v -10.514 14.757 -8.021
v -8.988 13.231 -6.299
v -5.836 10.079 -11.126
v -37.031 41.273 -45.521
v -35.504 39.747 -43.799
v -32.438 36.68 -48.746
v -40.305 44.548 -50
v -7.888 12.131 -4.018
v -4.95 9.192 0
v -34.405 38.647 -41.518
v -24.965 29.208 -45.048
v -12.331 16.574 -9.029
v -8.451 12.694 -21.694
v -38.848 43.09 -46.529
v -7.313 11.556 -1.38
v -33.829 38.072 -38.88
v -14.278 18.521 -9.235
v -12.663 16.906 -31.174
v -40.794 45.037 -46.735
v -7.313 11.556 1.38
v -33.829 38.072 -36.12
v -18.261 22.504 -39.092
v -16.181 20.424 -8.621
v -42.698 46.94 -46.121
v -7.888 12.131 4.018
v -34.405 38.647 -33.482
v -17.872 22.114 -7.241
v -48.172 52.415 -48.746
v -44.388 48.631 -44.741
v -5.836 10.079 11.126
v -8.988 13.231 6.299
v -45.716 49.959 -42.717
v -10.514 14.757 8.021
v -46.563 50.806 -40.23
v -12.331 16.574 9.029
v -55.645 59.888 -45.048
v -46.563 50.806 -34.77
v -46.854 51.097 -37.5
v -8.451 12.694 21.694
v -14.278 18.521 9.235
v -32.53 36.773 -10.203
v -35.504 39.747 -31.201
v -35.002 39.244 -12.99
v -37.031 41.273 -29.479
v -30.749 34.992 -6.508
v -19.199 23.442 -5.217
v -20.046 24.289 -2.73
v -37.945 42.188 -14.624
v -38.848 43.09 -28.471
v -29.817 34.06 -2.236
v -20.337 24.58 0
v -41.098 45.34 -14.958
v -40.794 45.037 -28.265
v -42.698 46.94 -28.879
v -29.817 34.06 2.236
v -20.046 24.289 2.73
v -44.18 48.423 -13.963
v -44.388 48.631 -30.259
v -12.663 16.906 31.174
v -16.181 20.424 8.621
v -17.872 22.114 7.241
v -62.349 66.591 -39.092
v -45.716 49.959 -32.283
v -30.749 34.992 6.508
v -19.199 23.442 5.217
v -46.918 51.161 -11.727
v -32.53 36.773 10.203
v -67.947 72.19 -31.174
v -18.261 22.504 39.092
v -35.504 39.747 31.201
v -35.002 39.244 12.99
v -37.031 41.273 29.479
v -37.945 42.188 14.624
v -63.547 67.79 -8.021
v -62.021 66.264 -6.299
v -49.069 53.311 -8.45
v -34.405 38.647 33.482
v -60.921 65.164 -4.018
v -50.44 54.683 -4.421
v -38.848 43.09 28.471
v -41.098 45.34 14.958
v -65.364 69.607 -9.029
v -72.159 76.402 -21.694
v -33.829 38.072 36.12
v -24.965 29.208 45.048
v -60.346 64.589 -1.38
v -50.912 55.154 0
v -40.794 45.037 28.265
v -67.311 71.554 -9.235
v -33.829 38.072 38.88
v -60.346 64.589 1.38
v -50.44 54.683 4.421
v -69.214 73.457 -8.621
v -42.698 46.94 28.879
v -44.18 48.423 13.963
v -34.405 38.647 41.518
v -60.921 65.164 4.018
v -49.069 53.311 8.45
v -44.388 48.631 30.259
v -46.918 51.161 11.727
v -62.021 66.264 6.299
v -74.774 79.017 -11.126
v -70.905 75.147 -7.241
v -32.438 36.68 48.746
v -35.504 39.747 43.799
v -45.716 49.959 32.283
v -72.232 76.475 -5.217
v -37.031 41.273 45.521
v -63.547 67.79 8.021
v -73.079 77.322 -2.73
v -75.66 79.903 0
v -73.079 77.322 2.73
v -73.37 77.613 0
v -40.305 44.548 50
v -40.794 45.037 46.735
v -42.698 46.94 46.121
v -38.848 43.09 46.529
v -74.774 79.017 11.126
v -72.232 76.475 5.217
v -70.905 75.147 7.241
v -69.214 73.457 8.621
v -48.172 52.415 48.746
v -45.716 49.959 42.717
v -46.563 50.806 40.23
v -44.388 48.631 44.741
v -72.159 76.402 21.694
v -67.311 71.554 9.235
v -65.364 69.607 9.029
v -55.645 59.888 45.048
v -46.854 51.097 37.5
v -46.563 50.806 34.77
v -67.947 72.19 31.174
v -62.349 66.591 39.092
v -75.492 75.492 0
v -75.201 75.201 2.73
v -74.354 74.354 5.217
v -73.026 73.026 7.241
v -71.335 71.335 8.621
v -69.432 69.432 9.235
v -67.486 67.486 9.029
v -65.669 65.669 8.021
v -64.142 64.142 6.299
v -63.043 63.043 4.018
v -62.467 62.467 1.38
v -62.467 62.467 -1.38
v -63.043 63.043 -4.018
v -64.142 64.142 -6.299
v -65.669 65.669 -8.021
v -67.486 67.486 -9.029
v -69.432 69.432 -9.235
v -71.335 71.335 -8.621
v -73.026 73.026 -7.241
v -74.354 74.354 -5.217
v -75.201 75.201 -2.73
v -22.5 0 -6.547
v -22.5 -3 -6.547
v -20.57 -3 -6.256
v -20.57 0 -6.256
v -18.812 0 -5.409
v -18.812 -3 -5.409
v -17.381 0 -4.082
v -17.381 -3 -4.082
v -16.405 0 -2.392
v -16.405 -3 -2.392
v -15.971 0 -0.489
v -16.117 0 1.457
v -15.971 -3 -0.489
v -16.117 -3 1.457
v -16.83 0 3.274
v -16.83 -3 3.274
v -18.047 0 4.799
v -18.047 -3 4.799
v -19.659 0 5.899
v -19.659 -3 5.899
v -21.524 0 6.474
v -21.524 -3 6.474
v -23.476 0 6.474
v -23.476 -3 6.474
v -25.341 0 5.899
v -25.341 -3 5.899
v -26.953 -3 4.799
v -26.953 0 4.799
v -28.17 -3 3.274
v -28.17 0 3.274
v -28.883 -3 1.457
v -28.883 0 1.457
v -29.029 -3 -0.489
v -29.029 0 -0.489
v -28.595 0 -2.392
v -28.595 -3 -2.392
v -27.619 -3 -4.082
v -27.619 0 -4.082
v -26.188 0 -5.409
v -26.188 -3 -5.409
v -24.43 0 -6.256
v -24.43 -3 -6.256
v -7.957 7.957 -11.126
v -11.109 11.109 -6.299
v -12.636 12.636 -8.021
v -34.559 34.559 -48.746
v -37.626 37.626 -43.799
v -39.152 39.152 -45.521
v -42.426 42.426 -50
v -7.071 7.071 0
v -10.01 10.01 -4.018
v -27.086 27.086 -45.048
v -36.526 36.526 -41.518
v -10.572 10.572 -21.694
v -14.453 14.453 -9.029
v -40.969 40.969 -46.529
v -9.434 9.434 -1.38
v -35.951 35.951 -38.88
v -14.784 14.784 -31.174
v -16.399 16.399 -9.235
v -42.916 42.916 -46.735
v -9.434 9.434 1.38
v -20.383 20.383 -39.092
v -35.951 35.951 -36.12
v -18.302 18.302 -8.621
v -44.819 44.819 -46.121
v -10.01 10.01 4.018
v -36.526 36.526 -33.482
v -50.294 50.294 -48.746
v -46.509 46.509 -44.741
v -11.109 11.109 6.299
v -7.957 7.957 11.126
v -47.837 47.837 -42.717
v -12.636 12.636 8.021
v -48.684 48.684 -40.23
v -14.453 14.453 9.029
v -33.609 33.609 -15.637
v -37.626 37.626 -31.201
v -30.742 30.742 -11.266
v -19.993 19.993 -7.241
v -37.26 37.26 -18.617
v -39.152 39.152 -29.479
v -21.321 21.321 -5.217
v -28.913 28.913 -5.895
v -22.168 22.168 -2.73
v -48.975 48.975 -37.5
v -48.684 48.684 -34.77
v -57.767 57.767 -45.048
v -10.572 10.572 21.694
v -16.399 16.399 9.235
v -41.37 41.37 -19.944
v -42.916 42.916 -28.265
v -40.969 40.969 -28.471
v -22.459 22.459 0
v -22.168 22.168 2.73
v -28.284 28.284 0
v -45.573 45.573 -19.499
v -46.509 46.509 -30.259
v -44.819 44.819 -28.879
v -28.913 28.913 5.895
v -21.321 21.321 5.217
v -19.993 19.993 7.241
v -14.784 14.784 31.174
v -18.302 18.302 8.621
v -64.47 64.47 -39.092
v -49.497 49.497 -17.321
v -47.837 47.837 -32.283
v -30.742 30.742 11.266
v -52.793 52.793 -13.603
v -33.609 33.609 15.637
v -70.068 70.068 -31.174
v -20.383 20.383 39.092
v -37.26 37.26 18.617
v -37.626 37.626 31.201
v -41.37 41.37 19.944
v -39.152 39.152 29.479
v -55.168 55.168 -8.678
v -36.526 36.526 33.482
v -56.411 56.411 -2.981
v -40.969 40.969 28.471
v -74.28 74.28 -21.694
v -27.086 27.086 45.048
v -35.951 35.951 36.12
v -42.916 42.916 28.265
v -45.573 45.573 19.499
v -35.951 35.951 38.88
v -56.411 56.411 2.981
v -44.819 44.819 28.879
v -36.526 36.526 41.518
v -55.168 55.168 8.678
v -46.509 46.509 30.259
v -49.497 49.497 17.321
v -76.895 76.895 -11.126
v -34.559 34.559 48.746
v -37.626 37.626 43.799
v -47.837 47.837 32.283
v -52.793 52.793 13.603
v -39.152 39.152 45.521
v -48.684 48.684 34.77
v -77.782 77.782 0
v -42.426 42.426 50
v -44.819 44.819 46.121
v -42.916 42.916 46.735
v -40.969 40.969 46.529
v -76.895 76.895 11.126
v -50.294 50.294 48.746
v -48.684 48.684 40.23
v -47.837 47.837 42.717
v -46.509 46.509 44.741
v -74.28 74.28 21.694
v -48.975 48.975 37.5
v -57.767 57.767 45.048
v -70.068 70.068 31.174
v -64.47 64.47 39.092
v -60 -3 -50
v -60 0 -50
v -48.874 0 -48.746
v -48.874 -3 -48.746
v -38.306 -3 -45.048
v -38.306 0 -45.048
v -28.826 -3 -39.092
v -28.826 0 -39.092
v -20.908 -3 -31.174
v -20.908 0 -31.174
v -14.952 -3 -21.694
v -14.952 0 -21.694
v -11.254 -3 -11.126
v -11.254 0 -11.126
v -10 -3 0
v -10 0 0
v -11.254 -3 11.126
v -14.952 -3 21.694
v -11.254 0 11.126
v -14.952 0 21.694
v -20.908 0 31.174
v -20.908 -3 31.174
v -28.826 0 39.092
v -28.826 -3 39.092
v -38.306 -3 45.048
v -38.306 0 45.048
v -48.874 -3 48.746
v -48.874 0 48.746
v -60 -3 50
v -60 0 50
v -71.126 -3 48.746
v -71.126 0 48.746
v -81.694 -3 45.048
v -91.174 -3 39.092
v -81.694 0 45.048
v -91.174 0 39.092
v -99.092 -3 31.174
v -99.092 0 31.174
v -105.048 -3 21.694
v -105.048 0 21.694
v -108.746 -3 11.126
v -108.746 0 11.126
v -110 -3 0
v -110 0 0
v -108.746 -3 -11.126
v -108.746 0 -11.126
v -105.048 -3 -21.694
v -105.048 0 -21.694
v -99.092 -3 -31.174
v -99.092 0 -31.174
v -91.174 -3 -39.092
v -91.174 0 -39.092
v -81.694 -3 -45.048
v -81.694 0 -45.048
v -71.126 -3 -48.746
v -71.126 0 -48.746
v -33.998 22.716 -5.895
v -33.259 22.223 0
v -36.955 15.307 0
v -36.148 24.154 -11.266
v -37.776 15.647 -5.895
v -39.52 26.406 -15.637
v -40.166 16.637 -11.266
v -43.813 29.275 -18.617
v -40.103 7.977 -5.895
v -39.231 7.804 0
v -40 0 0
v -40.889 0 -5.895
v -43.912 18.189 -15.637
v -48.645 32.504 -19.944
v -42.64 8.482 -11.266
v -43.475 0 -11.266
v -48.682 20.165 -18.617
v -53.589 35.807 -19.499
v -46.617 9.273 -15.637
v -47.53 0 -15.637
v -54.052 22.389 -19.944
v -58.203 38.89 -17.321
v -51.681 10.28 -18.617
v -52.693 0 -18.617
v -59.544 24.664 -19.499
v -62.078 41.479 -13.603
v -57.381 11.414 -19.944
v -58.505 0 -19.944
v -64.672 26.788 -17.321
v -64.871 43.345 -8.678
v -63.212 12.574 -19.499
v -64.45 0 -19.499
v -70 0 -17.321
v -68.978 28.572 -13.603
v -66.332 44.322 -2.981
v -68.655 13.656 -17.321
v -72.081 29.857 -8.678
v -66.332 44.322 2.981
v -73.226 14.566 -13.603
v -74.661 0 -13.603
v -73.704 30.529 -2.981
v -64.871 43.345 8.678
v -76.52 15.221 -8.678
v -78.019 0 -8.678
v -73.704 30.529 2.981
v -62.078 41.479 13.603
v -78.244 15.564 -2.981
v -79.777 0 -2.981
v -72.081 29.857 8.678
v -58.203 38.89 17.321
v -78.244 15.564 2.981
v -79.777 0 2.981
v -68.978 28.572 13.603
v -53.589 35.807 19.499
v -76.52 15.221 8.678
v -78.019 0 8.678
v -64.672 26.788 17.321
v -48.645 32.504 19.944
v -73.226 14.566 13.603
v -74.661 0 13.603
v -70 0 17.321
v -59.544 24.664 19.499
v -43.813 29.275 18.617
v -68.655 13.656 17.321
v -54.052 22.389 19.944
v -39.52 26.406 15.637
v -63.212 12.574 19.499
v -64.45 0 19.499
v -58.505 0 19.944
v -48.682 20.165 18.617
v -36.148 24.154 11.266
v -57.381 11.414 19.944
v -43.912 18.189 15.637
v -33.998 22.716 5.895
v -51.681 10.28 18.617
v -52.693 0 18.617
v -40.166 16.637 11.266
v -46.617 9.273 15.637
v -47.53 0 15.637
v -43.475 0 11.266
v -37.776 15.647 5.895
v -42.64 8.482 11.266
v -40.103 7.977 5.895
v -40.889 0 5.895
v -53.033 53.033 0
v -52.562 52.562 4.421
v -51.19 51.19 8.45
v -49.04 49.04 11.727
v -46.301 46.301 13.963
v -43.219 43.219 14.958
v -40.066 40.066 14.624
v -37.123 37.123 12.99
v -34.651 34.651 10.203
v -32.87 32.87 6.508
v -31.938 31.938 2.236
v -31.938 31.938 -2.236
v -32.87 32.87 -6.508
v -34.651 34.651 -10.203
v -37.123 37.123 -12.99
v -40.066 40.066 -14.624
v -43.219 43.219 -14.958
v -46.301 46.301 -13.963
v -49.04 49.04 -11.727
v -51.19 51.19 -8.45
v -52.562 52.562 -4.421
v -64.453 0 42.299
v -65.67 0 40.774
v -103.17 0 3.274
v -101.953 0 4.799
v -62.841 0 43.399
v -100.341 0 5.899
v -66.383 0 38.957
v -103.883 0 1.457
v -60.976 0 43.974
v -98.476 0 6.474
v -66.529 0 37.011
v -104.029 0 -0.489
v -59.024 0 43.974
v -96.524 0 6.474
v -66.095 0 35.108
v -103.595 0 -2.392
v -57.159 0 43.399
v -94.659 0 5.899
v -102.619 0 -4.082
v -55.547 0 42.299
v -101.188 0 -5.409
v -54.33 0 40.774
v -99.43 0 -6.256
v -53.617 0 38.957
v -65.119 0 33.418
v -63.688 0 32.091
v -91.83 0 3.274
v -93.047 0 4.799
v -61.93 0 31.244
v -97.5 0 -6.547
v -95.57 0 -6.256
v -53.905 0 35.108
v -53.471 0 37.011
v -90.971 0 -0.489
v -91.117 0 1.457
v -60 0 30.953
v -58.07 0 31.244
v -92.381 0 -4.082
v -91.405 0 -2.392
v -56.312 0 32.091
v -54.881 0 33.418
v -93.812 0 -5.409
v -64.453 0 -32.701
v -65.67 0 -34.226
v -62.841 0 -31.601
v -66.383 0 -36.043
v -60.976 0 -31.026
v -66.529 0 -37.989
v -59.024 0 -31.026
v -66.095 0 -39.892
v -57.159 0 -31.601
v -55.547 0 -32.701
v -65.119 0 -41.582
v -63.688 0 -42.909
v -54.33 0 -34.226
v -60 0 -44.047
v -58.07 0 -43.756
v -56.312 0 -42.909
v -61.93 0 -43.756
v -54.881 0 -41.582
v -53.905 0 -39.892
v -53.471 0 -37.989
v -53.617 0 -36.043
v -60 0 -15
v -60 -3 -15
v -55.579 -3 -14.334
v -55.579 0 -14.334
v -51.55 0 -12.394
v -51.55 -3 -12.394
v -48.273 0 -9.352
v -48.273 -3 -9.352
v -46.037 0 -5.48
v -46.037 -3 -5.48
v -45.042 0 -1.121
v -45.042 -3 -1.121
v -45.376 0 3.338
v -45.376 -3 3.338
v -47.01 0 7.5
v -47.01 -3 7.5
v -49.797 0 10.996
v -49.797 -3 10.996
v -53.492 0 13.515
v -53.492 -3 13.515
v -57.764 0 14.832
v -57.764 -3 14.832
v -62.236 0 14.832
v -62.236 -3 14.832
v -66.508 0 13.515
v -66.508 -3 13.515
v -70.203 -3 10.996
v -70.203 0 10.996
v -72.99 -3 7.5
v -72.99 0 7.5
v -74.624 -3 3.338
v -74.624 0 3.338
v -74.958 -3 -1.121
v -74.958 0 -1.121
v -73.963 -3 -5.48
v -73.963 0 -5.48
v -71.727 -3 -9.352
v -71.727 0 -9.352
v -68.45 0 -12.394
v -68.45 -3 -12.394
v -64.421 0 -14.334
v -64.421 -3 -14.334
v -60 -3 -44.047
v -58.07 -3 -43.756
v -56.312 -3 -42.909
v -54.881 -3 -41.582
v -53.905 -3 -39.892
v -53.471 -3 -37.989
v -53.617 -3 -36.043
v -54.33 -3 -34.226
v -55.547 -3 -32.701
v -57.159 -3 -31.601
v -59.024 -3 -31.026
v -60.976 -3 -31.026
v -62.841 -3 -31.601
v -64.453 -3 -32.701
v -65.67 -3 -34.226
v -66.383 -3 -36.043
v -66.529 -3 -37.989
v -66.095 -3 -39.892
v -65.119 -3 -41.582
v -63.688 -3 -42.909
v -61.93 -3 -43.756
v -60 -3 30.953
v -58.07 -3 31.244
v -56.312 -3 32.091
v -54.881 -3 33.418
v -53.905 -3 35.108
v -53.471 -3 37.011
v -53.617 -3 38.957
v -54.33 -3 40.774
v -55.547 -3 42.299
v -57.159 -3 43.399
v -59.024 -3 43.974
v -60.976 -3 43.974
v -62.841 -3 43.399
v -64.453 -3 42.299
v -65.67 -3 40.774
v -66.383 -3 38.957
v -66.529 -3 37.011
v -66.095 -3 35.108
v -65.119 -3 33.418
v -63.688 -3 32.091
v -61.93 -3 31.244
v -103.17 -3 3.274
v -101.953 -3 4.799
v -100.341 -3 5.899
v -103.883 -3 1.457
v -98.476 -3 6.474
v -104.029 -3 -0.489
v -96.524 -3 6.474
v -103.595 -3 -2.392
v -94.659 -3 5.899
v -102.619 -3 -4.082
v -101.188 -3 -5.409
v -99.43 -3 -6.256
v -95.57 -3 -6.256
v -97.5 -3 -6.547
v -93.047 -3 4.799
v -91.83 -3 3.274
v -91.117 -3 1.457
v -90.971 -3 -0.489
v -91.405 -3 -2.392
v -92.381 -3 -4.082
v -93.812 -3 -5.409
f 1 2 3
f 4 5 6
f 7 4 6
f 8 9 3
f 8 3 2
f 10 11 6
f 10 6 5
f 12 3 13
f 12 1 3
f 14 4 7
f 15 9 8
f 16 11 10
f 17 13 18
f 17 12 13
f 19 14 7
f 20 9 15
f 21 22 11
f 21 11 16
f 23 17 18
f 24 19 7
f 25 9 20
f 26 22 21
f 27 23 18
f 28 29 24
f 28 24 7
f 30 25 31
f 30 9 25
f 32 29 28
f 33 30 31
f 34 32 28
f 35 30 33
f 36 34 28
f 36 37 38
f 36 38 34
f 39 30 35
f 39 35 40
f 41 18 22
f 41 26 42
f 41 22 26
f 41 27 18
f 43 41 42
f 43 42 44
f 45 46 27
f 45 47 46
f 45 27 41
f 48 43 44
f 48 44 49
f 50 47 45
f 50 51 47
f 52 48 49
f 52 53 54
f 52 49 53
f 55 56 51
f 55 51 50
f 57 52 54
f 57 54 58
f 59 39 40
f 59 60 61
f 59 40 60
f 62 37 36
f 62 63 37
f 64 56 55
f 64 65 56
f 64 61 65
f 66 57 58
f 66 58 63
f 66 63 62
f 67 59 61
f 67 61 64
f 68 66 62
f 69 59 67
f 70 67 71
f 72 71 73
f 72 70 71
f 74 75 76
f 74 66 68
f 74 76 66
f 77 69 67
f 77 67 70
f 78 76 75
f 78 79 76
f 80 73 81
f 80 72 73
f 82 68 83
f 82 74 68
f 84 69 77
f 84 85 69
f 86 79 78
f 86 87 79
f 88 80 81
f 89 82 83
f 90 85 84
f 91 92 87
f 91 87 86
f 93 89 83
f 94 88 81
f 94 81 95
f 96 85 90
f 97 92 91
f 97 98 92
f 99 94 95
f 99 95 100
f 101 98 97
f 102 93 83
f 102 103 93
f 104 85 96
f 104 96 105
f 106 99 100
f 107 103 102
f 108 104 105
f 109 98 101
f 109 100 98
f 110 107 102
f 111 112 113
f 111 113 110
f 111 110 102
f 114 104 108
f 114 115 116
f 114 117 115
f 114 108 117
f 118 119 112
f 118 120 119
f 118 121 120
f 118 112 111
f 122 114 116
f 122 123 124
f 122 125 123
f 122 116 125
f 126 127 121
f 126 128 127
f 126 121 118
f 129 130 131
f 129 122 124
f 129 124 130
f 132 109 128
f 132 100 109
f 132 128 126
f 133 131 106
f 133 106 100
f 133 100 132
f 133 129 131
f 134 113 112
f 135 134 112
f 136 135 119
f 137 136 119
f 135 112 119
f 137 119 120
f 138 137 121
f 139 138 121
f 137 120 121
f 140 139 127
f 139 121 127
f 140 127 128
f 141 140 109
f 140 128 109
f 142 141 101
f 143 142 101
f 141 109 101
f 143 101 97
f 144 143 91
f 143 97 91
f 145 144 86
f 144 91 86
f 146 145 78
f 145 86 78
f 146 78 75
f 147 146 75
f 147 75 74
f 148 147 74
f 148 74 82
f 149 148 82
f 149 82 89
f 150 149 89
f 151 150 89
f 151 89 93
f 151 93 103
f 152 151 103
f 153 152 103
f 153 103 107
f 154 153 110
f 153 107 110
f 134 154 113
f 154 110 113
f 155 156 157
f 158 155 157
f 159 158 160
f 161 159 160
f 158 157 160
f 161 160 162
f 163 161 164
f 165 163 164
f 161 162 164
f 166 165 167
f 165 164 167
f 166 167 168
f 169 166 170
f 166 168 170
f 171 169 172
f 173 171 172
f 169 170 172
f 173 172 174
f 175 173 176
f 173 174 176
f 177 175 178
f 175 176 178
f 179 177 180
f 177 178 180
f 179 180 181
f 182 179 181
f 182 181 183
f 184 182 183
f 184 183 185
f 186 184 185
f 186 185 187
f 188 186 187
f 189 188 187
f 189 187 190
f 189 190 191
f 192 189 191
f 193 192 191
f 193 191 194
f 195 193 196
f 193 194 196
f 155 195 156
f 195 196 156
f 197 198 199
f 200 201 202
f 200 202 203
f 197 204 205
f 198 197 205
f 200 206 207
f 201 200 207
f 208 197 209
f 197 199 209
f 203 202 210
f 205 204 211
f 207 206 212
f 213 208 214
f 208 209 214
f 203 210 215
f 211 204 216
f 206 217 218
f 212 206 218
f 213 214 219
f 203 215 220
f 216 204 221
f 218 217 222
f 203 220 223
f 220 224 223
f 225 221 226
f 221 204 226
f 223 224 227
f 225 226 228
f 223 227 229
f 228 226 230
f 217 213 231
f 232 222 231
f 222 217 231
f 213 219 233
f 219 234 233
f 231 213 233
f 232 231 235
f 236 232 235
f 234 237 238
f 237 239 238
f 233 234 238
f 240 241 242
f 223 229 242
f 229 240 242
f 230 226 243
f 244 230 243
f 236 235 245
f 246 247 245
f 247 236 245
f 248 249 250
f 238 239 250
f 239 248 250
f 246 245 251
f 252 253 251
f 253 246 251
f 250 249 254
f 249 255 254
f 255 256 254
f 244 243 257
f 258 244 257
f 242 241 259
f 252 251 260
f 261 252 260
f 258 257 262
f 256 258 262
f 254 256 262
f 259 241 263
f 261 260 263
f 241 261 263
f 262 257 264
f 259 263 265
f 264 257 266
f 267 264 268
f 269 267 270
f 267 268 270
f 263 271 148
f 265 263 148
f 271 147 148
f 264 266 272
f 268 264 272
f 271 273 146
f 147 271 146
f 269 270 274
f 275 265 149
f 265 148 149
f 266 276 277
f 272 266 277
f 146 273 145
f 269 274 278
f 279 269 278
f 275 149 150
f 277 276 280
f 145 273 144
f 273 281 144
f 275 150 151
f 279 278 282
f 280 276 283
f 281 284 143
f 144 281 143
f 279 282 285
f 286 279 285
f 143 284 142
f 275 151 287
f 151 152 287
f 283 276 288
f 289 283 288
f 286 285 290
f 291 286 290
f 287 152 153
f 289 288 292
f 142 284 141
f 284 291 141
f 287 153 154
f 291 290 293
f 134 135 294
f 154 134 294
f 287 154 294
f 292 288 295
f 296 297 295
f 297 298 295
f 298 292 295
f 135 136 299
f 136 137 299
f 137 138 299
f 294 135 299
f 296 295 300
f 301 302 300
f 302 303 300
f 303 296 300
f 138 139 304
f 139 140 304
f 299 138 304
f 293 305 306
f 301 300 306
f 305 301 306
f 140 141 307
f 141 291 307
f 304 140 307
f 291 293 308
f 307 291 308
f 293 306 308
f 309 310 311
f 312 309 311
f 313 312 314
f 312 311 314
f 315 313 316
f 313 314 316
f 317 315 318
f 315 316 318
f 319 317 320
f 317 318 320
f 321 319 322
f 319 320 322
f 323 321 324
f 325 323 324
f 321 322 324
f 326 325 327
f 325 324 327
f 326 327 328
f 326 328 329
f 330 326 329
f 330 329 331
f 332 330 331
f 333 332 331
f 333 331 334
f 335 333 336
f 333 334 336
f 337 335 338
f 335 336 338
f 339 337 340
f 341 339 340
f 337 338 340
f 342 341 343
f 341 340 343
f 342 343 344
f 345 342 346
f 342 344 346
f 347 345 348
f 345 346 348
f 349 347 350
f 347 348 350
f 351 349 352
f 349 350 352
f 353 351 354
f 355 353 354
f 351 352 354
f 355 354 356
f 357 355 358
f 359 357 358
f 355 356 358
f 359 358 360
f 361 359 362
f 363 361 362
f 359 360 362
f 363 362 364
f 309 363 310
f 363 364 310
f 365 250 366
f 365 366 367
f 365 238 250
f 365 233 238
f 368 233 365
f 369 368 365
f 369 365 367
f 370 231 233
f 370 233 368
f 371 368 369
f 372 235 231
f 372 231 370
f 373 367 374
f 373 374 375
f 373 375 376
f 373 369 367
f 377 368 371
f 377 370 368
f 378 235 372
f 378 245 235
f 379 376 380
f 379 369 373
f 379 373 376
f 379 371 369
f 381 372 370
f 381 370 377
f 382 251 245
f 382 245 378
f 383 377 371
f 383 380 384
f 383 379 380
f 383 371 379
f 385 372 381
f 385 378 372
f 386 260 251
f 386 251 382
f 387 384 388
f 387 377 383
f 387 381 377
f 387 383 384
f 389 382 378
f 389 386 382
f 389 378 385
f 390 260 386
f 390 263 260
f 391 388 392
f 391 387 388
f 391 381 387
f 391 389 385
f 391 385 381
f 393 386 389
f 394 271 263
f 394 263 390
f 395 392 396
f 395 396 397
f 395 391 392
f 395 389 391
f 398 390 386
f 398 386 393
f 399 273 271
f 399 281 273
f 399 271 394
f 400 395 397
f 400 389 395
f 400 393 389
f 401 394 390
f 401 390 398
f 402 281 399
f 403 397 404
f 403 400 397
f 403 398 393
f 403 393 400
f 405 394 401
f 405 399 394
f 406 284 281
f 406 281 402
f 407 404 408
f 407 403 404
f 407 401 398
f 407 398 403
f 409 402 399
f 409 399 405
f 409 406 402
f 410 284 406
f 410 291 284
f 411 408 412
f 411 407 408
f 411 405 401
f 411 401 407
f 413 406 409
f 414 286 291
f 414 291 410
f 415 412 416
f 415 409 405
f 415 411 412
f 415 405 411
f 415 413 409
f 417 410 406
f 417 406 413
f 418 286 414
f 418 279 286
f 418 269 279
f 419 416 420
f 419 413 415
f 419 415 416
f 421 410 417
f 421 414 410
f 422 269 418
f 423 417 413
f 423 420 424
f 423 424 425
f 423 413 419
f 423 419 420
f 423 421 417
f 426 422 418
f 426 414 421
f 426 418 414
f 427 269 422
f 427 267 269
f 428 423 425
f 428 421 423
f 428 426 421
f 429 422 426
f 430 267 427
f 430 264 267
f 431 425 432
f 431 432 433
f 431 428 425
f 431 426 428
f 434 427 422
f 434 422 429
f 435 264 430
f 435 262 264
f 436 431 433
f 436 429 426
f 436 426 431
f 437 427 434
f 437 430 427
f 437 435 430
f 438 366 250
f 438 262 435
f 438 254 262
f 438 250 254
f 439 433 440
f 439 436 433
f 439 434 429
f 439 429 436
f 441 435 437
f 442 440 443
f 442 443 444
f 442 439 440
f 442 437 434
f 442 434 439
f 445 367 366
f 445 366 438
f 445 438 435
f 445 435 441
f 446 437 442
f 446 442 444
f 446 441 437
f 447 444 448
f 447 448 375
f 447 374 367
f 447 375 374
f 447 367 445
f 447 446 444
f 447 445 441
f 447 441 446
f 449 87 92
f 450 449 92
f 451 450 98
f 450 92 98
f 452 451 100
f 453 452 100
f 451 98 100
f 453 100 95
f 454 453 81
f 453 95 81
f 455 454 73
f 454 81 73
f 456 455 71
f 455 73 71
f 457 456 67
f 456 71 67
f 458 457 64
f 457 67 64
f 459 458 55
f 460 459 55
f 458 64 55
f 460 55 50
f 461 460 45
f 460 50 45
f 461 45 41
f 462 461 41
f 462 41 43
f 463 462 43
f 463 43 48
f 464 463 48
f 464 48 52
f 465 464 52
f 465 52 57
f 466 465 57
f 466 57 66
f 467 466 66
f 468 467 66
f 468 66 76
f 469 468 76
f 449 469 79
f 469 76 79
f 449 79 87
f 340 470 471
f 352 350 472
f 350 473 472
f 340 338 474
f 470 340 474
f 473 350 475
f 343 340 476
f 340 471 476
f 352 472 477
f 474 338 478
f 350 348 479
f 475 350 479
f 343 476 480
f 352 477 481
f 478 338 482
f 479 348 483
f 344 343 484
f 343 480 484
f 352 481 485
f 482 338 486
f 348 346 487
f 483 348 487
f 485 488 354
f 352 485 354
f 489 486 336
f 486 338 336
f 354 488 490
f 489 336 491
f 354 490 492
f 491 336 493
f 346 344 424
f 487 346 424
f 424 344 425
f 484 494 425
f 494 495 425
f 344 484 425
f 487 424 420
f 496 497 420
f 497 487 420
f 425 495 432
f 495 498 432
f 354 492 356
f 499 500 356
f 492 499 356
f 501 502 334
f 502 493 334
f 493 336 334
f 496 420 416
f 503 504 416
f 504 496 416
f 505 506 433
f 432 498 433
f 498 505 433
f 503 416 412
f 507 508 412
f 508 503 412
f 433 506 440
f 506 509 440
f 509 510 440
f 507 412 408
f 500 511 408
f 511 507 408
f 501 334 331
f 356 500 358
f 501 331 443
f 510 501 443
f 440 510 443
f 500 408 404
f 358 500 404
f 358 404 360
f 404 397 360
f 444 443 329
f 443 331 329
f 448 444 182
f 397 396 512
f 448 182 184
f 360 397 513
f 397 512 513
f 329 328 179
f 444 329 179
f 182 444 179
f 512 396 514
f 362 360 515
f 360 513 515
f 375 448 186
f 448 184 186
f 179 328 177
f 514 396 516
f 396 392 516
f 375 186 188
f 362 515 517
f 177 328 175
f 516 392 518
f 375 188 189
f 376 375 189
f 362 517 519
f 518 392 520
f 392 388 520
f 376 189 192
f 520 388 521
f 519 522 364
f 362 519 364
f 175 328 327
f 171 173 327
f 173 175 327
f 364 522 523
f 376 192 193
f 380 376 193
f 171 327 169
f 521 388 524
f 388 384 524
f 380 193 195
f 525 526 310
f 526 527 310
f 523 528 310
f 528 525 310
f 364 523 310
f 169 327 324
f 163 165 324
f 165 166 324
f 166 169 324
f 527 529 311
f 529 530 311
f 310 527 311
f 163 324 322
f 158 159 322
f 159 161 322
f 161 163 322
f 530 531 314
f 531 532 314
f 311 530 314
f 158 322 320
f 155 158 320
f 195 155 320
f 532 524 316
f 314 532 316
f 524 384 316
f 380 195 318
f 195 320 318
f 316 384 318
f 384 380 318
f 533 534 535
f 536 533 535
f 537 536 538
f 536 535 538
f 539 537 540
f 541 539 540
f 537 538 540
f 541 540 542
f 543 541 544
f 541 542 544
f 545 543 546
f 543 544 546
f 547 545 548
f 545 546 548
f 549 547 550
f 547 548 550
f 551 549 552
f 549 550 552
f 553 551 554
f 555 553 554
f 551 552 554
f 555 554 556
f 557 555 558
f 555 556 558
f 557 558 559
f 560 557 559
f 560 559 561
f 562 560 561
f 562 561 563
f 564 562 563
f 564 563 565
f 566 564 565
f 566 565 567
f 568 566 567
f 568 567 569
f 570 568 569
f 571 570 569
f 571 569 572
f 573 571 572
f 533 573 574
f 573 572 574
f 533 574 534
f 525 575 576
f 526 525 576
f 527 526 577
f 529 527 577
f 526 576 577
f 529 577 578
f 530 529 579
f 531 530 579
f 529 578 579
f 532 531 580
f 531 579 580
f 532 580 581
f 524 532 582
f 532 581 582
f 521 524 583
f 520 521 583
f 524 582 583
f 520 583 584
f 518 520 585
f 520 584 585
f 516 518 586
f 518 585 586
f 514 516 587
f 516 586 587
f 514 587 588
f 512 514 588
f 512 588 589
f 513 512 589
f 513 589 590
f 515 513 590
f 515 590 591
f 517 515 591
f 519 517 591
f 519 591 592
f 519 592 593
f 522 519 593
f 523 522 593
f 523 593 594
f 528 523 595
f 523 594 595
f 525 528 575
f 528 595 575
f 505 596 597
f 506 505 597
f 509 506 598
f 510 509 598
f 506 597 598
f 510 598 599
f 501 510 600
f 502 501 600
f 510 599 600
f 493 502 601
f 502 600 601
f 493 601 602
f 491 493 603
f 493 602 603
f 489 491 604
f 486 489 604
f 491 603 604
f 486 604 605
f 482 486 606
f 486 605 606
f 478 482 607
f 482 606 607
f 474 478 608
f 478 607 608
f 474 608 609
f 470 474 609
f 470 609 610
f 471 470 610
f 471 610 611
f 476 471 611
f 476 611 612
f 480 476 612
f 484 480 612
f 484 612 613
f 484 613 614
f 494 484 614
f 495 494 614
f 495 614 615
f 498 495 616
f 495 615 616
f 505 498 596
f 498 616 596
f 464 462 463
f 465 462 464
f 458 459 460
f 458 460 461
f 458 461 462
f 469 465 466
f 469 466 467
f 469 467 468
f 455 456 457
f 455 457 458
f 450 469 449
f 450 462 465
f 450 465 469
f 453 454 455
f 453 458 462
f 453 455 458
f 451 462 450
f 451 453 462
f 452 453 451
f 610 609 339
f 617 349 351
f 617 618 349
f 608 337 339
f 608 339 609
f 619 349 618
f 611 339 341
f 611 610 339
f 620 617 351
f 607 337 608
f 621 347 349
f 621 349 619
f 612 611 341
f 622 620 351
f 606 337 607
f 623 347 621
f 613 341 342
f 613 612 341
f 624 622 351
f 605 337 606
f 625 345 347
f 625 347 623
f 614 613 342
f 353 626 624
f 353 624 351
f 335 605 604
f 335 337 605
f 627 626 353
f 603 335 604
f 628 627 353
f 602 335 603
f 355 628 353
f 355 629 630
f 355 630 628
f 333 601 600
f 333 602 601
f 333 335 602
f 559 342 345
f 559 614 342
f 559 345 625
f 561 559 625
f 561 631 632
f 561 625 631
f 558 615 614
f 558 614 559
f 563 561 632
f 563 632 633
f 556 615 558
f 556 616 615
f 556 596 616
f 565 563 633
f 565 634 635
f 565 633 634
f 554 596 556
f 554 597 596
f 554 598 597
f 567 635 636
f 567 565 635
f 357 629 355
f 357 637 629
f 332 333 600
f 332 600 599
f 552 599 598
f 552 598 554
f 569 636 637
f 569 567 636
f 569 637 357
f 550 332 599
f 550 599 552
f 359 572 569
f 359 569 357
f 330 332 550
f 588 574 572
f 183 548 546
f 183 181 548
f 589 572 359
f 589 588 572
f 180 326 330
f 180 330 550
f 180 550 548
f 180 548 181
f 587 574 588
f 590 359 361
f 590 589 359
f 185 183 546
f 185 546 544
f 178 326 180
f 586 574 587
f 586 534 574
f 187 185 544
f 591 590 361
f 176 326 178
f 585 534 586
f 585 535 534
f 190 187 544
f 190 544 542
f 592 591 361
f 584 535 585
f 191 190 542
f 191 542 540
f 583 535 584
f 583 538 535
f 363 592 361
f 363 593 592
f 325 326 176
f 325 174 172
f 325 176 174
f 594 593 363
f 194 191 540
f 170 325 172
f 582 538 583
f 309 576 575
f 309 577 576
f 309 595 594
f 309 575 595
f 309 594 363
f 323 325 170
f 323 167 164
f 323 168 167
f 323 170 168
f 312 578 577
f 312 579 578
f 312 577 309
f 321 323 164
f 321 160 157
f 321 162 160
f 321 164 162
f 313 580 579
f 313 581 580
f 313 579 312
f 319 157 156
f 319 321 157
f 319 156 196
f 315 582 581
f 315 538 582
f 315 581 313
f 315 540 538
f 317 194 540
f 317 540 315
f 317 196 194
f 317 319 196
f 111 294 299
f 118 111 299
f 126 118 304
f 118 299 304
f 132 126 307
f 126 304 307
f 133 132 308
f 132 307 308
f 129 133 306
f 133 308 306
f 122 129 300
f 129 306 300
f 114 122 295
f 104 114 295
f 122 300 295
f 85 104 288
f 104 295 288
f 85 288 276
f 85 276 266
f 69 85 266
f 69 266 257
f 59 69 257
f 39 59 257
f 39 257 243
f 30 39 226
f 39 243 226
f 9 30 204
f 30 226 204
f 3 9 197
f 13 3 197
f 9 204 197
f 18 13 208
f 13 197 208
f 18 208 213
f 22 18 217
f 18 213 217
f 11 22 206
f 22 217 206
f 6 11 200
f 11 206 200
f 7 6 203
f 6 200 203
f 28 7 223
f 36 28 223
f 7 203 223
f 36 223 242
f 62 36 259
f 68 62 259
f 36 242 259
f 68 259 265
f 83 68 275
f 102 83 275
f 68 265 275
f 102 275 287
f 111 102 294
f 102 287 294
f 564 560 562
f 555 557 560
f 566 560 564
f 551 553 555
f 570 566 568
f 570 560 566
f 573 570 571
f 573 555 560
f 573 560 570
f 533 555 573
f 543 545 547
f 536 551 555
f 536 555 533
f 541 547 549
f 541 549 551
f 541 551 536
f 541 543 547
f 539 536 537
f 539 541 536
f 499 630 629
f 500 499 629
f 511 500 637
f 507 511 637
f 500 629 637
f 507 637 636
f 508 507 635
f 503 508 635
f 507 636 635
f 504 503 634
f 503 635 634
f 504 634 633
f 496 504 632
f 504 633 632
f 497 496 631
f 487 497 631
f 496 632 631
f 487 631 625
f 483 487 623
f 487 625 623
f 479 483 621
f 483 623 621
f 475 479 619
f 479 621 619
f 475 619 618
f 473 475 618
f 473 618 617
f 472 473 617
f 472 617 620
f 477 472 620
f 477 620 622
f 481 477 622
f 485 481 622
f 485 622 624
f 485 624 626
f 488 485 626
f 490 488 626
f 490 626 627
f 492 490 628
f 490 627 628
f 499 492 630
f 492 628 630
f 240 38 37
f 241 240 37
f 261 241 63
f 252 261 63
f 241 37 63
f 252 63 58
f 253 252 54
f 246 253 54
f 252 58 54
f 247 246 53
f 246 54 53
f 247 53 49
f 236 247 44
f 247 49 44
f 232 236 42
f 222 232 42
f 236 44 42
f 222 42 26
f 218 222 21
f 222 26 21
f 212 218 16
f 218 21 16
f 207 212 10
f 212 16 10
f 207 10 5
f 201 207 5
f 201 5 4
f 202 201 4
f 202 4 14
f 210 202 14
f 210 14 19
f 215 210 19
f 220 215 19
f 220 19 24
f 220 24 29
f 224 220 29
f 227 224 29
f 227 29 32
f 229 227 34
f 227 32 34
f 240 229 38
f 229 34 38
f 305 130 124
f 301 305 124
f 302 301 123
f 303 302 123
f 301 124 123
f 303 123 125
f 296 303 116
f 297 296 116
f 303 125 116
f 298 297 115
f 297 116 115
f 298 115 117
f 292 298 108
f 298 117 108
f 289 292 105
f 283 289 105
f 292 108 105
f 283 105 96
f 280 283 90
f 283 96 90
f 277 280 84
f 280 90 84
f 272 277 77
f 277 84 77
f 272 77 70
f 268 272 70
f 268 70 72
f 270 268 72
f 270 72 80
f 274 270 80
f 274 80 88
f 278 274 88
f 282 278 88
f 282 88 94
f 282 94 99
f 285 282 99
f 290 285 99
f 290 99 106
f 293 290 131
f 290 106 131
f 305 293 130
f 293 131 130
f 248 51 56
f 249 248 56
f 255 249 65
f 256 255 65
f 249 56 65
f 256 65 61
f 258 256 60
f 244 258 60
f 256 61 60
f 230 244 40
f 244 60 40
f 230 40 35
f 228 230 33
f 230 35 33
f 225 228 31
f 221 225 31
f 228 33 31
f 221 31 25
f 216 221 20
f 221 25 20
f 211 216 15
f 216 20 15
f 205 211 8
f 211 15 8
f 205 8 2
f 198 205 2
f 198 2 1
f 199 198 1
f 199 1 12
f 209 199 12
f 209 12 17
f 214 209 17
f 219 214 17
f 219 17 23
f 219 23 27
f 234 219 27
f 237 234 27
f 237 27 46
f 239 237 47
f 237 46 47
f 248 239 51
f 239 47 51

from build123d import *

# Parameters (mm, degrees)
SKETCH_2_R          = 20
SKETCH_5_R          = 50
EXTRUDE_1_DEPTH     = 3
SKETCH_6_R          = 15
SKETCH_6_R_2        = 9.261363372
CUT_EXTRUDE_1_DEPTH = 3
SKETCH_8_R          = 50
EXTRUDE_2_DEPTH     = 3
SKETCH_9_R          = 15
SKETCH_9_R_2        = 6.547134089
CUT_EXTRUDE_2_DEPTH = 3


with BuildPart() as part:
    # 扫描1: sweep along a path in 草图1
    with BuildLine(Plane.XY) as sweep_1_path:
        ThreePointArc((-42.426406871, 42.426406871), (-55.432771951, 22.961005942), (-60, 0))
    # 草图2 → 扫描1 (sweep)
    with BuildSketch(Plane(origin=(0, 0, 0), x_dir=(1, 0, 0), z_dir=(0, 1, 0))):
        with Locations((-60, 0)):
            Circle(SKETCH_2_R)
    sweep(path=sweep_1_path.line)

    # 草图5 → 凸台-拉伸1 (add)
    with BuildSketch(Plane(origin=(0, 0, 0), x_dir=(0, 0, -1), z_dir=(0.7071067811865434, 0.7071067811865517, 0))):
        with Locations(Location((0, 60, 0), (0, 0, 90))):
            Circle(SKETCH_5_R)
    extrude(amount=EXTRUDE_1_DEPTH)

    # 草图6 → 切除-拉伸1 (cut)
    with BuildSketch(Plane(origin=(2.121320344, 2.121320344, 0), x_dir=(0, 0, -1), z_dir=(0.7071067811865434, 0.7071067811865517, 0))):
        with Locations(Location((0, 60, 0), (0, 0, 90))):
            Circle(SKETCH_6_R)
        with Locations(Location((0, 97.5, 0), (0, 0, 90))):
            Circle(SKETCH_6_R_2)
        with Locations(Location((37.5, 60, 0), (0, 0, 90))):
            Circle(SKETCH_6_R_2)
        with Locations(Location((0, 22.5, 0), (0, 0, 90))):
            Circle(SKETCH_6_R_2)
        with Locations(Location((-37.5, 60, 0), (0, 0, 90))):
            Circle(SKETCH_6_R_2)
    extrude(amount=-CUT_EXTRUDE_1_DEPTH, mode=Mode.SUBTRACT)

    # 草图8 → 凸台-拉伸2 (add)
    with BuildSketch(Plane.XZ):
        with Locations(Location((-60, 0, 0), (0, 0, 270))):
            Circle(SKETCH_8_R)
    extrude(amount=EXTRUDE_2_DEPTH)

    # 草图9 → 切除-拉伸2 (cut)
    with BuildSketch(Plane.XZ.offset(3)):
        with Locations(Location((-60, 0, 0), (0, 0, 270))):
            Circle(SKETCH_9_R)
        with Locations(Location((-60, 37.5, 0), (0, 0, 270))):
            Circle(SKETCH_9_R_2)
        with Locations(Location((-22.5, 0, 0), (0, 0, 270))):
            Circle(SKETCH_9_R_2)
        with Locations(Location((-60, -37.5, 0), (0, 0, 270))):
            Circle(SKETCH_9_R_2)
        with Locations(Location((-97.5, 0, 0), (0, 0, 270))):
            Circle(SKETCH_9_R_2)
    extrude(amount=-CUT_EXTRUDE_2_DEPTH, mode=Mode.SUBTRACT)


solid = part.part
